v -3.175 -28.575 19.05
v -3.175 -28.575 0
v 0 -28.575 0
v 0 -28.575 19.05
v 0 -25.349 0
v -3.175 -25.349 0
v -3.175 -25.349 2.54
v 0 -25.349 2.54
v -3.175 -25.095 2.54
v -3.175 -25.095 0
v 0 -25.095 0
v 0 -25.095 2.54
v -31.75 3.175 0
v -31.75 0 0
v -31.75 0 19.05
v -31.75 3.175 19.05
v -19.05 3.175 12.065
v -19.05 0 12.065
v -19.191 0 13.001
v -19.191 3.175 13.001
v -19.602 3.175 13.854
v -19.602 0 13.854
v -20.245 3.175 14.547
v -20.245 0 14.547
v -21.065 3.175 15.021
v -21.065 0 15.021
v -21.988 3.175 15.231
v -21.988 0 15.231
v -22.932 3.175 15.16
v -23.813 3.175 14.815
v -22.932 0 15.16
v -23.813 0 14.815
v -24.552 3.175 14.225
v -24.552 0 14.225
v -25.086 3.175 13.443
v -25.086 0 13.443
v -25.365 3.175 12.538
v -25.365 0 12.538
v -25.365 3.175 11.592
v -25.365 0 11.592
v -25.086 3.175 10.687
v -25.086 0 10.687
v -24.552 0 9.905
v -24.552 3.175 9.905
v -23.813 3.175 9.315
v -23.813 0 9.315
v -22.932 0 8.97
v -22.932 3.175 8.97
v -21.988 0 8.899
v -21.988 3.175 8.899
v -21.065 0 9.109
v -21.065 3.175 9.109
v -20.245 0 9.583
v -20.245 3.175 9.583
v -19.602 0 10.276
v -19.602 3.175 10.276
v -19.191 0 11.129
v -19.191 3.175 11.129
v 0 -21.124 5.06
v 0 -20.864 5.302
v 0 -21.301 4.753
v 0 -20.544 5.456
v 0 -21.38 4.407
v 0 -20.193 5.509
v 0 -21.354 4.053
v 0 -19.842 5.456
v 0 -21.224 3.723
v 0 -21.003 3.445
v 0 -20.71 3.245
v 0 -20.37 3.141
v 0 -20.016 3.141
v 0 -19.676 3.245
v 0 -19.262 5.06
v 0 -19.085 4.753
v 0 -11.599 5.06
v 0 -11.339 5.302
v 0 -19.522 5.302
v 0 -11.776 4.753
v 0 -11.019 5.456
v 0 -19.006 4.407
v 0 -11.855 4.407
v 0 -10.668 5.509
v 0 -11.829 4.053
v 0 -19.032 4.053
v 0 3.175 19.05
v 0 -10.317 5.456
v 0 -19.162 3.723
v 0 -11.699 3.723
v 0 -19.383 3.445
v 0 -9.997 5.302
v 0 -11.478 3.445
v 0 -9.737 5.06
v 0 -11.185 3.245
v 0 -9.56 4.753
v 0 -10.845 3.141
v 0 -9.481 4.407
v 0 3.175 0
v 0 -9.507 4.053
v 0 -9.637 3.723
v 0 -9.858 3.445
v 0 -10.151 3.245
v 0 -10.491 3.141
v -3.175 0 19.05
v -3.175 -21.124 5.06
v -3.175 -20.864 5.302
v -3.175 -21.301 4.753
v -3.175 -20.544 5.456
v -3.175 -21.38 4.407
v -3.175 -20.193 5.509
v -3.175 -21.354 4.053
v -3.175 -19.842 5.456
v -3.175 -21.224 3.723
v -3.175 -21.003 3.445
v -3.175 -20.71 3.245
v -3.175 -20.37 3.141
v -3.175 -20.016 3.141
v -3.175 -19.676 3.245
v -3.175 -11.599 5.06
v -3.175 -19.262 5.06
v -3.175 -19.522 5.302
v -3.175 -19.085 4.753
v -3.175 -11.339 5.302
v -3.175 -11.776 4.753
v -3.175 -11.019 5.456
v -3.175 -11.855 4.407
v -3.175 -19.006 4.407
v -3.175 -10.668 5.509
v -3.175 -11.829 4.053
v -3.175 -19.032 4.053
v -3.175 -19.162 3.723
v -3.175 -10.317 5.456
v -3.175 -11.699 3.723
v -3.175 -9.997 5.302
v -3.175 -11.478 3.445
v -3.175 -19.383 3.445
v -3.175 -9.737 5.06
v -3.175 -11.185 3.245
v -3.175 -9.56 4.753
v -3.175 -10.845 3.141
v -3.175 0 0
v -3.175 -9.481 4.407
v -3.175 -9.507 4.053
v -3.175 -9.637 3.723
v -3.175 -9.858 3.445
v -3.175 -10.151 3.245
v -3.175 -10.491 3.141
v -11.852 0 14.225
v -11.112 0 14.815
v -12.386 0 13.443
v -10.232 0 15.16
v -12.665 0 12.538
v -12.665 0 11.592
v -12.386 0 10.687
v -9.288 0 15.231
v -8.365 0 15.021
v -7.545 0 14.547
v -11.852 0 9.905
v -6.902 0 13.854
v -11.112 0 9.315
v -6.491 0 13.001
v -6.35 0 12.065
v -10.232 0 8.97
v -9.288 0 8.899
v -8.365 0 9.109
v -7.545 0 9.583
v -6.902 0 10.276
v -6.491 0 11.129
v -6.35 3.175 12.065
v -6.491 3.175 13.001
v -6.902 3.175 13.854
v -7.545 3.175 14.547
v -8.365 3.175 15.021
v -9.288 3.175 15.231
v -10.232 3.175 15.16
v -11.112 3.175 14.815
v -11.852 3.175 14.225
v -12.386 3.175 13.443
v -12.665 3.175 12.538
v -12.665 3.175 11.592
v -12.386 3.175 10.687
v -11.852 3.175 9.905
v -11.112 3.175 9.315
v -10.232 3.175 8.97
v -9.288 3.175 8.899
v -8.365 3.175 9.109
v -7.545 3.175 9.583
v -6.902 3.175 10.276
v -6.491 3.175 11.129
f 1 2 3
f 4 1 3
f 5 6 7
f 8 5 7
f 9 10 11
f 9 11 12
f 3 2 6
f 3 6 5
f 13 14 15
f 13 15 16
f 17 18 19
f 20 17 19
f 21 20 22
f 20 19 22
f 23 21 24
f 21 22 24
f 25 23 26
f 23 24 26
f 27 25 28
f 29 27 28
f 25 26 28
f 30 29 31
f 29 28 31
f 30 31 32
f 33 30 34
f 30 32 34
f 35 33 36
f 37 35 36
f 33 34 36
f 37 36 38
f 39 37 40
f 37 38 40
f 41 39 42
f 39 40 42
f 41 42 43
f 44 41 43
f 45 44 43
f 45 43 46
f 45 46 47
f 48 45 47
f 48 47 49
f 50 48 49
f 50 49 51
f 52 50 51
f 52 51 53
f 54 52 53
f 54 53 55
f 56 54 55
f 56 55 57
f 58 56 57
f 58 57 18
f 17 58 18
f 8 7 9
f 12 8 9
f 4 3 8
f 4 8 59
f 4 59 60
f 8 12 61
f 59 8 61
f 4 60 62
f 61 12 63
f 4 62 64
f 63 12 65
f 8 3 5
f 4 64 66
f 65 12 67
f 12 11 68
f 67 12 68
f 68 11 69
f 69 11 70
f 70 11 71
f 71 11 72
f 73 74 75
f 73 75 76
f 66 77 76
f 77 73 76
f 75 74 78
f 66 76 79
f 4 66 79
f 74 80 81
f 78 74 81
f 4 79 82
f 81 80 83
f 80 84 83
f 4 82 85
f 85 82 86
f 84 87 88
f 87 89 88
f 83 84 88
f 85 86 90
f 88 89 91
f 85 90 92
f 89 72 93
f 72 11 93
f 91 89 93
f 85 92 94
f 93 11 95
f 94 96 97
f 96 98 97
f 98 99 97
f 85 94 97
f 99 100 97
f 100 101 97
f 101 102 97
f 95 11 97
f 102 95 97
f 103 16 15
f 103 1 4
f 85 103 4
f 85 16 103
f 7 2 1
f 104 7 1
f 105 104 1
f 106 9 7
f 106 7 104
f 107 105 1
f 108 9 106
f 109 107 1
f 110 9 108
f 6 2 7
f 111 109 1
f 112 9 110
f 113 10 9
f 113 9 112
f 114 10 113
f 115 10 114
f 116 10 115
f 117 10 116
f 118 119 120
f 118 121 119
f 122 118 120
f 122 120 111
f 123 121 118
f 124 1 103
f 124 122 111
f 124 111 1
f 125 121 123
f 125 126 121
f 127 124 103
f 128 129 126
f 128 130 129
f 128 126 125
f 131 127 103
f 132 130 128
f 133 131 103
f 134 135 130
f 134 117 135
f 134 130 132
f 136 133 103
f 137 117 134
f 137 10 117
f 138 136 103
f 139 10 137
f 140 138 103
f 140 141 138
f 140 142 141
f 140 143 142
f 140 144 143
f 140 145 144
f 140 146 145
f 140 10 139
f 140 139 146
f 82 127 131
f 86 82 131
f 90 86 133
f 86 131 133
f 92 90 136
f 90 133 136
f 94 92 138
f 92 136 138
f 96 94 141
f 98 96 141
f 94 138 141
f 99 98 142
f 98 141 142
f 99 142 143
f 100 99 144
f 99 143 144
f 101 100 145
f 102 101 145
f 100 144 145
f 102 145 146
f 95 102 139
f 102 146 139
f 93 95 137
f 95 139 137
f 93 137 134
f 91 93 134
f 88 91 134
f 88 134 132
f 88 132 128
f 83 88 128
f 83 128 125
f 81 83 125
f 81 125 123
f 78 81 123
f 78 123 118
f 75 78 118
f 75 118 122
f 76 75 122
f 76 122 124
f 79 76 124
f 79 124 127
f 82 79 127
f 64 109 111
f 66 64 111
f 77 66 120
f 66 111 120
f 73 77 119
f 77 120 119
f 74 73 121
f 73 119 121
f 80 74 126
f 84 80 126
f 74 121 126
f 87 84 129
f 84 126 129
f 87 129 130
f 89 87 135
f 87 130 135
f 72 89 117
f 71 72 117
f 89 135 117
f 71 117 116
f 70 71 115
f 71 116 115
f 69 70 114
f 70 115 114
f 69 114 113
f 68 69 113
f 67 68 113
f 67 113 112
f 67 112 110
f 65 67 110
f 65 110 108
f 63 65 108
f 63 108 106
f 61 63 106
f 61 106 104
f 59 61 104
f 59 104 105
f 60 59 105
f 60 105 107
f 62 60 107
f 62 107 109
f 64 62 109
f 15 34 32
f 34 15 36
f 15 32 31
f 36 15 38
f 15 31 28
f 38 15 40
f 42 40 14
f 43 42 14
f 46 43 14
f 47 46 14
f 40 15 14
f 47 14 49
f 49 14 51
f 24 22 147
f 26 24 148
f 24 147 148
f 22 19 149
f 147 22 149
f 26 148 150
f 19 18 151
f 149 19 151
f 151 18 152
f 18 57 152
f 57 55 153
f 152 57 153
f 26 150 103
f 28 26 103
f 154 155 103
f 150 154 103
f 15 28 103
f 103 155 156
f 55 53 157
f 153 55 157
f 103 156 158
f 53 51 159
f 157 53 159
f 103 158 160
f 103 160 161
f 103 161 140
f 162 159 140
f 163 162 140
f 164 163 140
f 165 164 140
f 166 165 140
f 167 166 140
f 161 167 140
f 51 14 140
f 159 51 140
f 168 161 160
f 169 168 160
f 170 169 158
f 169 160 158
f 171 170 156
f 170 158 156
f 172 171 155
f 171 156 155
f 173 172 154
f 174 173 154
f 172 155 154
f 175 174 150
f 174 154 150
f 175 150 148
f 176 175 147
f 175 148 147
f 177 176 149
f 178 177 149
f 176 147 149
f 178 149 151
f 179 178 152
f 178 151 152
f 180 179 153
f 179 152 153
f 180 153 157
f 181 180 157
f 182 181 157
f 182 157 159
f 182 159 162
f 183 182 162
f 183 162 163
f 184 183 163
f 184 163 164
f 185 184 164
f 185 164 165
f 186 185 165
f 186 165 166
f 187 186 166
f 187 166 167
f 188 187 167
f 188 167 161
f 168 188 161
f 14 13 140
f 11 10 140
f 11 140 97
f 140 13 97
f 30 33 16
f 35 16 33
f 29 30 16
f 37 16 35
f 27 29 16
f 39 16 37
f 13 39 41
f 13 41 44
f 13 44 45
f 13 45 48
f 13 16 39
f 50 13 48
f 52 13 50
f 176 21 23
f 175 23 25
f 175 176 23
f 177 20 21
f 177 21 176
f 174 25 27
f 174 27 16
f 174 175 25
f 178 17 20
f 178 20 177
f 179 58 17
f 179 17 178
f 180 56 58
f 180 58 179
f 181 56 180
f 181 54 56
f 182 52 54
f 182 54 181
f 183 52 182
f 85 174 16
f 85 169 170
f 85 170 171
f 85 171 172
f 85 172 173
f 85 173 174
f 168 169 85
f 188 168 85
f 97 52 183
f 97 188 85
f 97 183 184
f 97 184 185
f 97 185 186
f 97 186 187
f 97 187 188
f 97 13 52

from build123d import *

# Parameters (mm, degrees)
SKETCH1_W           = 31.75
SKETCH1_H           = 3.175
SKETCH1_W_2         = 3.175
SKETCH1_H_2         = 28.575
BOSS_EXTRUDE1_DEPTH = 19.05
SWITCH_MOUNT_REACH  = 5.175
SKETCH2_R           = 1.190625
SKETCH2_W           = 2.54
SKETCH2_H           = 0.254
BRACKET_MOUNT_REACH = 5.175
SKETCH3_R           = 3.175


with BuildPart() as part:
    # Sketch1 → Boss-Extrude1 (new body)
    with BuildSketch(Plane.XY):
        with Locations((-15.875, 1.5875)):
            Rectangle(SKETCH1_W, SKETCH1_H)
        with Locations((-1.5875, -14.2875)):
            Rectangle(SKETCH1_W_2, SKETCH1_H_2)
    extrude(amount=BOSS_EXTRUDE1_DEPTH)

    # Sketch2 → Switch Mount (cut, up to next)
    with BuildSketch(Plane.ZY.offset(3.175), mode=Mode.PRIVATE) as switch_mount_sk1:
        with Locations((4.318, -10.668)):
            Circle(SKETCH2_R)
    switch_mount_tool1 = extrude(switch_mount_sk1.sketch, amount=-SWITCH_MOUNT_REACH, mode=Mode.PRIVATE) & part.part
    add(switch_mount_tool1.solids().sort_by_distance((-3.175, -10.668, 4.318))[0], mode=Mode.SUBTRACT)
    # Sketch2 → Switch Mount (cut, up to next)
    with BuildSketch(Plane.ZY.offset(3.175), mode=Mode.PRIVATE) as switch_mount_sk2:
        with Locations((4.318, -20.193)):
            Circle(SKETCH2_R)
    switch_mount_tool2 = extrude(switch_mount_sk2.sketch, amount=-SWITCH_MOUNT_REACH, mode=Mode.PRIVATE) & part.part
    add(switch_mount_tool2.solids().sort_by_distance((-3.175, -20.193, 4.318))[0], mode=Mode.SUBTRACT)
    # Sketch2 → Switch Mount (cut, up to next)
    with BuildSketch(Plane.ZY.offset(3.175), mode=Mode.PRIVATE) as switch_mount_sk3:
        with Locations((1.27, -25.2222)):
            Rectangle(SKETCH2_W, SKETCH2_H)
    switch_mount_tool3 = extrude(switch_mount_sk3.sketch, amount=-SWITCH_MOUNT_REACH, mode=Mode.PRIVATE) & part.part
    add(switch_mount_tool3.solids().sort_by_distance((-3.175, -25.2222, 1.27))[0], mode=Mode.SUBTRACT)

    # Sketch3 → Bracket Mount (cut, up to next)
    with BuildSketch(Plane.XZ, mode=Mode.PRIVATE) as bracket_mount_sk1:
        with Locations((-9.525, 12.065)):
            Circle(SKETCH3_R)
    bracket_mount_tool1 = extrude(bracket_mount_sk1.sketch, amount=-BRACKET_MOUNT_REACH, mode=Mode.PRIVATE) & part.part
    add(bracket_mount_tool1.solids().sort_by_distance((-9.525, 0, 12.065))[0], mode=Mode.SUBTRACT)
    # Sketch3 → Bracket Mount (cut, up to next)
    with BuildSketch(Plane.XZ, mode=Mode.PRIVATE) as bracket_mount_sk2:
        with Locations((-22.225, 12.065)):
            Circle(SKETCH3_R)
    bracket_mount_tool2 = extrude(bracket_mount_sk2.sketch, amount=-BRACKET_MOUNT_REACH, mode=Mode.PRIVATE) & part.part
    add(bracket_mount_tool2.solids().sort_by_distance((-22.225, 0, 12.065))[0], mode=Mode.SUBTRACT)


solid = part.part
